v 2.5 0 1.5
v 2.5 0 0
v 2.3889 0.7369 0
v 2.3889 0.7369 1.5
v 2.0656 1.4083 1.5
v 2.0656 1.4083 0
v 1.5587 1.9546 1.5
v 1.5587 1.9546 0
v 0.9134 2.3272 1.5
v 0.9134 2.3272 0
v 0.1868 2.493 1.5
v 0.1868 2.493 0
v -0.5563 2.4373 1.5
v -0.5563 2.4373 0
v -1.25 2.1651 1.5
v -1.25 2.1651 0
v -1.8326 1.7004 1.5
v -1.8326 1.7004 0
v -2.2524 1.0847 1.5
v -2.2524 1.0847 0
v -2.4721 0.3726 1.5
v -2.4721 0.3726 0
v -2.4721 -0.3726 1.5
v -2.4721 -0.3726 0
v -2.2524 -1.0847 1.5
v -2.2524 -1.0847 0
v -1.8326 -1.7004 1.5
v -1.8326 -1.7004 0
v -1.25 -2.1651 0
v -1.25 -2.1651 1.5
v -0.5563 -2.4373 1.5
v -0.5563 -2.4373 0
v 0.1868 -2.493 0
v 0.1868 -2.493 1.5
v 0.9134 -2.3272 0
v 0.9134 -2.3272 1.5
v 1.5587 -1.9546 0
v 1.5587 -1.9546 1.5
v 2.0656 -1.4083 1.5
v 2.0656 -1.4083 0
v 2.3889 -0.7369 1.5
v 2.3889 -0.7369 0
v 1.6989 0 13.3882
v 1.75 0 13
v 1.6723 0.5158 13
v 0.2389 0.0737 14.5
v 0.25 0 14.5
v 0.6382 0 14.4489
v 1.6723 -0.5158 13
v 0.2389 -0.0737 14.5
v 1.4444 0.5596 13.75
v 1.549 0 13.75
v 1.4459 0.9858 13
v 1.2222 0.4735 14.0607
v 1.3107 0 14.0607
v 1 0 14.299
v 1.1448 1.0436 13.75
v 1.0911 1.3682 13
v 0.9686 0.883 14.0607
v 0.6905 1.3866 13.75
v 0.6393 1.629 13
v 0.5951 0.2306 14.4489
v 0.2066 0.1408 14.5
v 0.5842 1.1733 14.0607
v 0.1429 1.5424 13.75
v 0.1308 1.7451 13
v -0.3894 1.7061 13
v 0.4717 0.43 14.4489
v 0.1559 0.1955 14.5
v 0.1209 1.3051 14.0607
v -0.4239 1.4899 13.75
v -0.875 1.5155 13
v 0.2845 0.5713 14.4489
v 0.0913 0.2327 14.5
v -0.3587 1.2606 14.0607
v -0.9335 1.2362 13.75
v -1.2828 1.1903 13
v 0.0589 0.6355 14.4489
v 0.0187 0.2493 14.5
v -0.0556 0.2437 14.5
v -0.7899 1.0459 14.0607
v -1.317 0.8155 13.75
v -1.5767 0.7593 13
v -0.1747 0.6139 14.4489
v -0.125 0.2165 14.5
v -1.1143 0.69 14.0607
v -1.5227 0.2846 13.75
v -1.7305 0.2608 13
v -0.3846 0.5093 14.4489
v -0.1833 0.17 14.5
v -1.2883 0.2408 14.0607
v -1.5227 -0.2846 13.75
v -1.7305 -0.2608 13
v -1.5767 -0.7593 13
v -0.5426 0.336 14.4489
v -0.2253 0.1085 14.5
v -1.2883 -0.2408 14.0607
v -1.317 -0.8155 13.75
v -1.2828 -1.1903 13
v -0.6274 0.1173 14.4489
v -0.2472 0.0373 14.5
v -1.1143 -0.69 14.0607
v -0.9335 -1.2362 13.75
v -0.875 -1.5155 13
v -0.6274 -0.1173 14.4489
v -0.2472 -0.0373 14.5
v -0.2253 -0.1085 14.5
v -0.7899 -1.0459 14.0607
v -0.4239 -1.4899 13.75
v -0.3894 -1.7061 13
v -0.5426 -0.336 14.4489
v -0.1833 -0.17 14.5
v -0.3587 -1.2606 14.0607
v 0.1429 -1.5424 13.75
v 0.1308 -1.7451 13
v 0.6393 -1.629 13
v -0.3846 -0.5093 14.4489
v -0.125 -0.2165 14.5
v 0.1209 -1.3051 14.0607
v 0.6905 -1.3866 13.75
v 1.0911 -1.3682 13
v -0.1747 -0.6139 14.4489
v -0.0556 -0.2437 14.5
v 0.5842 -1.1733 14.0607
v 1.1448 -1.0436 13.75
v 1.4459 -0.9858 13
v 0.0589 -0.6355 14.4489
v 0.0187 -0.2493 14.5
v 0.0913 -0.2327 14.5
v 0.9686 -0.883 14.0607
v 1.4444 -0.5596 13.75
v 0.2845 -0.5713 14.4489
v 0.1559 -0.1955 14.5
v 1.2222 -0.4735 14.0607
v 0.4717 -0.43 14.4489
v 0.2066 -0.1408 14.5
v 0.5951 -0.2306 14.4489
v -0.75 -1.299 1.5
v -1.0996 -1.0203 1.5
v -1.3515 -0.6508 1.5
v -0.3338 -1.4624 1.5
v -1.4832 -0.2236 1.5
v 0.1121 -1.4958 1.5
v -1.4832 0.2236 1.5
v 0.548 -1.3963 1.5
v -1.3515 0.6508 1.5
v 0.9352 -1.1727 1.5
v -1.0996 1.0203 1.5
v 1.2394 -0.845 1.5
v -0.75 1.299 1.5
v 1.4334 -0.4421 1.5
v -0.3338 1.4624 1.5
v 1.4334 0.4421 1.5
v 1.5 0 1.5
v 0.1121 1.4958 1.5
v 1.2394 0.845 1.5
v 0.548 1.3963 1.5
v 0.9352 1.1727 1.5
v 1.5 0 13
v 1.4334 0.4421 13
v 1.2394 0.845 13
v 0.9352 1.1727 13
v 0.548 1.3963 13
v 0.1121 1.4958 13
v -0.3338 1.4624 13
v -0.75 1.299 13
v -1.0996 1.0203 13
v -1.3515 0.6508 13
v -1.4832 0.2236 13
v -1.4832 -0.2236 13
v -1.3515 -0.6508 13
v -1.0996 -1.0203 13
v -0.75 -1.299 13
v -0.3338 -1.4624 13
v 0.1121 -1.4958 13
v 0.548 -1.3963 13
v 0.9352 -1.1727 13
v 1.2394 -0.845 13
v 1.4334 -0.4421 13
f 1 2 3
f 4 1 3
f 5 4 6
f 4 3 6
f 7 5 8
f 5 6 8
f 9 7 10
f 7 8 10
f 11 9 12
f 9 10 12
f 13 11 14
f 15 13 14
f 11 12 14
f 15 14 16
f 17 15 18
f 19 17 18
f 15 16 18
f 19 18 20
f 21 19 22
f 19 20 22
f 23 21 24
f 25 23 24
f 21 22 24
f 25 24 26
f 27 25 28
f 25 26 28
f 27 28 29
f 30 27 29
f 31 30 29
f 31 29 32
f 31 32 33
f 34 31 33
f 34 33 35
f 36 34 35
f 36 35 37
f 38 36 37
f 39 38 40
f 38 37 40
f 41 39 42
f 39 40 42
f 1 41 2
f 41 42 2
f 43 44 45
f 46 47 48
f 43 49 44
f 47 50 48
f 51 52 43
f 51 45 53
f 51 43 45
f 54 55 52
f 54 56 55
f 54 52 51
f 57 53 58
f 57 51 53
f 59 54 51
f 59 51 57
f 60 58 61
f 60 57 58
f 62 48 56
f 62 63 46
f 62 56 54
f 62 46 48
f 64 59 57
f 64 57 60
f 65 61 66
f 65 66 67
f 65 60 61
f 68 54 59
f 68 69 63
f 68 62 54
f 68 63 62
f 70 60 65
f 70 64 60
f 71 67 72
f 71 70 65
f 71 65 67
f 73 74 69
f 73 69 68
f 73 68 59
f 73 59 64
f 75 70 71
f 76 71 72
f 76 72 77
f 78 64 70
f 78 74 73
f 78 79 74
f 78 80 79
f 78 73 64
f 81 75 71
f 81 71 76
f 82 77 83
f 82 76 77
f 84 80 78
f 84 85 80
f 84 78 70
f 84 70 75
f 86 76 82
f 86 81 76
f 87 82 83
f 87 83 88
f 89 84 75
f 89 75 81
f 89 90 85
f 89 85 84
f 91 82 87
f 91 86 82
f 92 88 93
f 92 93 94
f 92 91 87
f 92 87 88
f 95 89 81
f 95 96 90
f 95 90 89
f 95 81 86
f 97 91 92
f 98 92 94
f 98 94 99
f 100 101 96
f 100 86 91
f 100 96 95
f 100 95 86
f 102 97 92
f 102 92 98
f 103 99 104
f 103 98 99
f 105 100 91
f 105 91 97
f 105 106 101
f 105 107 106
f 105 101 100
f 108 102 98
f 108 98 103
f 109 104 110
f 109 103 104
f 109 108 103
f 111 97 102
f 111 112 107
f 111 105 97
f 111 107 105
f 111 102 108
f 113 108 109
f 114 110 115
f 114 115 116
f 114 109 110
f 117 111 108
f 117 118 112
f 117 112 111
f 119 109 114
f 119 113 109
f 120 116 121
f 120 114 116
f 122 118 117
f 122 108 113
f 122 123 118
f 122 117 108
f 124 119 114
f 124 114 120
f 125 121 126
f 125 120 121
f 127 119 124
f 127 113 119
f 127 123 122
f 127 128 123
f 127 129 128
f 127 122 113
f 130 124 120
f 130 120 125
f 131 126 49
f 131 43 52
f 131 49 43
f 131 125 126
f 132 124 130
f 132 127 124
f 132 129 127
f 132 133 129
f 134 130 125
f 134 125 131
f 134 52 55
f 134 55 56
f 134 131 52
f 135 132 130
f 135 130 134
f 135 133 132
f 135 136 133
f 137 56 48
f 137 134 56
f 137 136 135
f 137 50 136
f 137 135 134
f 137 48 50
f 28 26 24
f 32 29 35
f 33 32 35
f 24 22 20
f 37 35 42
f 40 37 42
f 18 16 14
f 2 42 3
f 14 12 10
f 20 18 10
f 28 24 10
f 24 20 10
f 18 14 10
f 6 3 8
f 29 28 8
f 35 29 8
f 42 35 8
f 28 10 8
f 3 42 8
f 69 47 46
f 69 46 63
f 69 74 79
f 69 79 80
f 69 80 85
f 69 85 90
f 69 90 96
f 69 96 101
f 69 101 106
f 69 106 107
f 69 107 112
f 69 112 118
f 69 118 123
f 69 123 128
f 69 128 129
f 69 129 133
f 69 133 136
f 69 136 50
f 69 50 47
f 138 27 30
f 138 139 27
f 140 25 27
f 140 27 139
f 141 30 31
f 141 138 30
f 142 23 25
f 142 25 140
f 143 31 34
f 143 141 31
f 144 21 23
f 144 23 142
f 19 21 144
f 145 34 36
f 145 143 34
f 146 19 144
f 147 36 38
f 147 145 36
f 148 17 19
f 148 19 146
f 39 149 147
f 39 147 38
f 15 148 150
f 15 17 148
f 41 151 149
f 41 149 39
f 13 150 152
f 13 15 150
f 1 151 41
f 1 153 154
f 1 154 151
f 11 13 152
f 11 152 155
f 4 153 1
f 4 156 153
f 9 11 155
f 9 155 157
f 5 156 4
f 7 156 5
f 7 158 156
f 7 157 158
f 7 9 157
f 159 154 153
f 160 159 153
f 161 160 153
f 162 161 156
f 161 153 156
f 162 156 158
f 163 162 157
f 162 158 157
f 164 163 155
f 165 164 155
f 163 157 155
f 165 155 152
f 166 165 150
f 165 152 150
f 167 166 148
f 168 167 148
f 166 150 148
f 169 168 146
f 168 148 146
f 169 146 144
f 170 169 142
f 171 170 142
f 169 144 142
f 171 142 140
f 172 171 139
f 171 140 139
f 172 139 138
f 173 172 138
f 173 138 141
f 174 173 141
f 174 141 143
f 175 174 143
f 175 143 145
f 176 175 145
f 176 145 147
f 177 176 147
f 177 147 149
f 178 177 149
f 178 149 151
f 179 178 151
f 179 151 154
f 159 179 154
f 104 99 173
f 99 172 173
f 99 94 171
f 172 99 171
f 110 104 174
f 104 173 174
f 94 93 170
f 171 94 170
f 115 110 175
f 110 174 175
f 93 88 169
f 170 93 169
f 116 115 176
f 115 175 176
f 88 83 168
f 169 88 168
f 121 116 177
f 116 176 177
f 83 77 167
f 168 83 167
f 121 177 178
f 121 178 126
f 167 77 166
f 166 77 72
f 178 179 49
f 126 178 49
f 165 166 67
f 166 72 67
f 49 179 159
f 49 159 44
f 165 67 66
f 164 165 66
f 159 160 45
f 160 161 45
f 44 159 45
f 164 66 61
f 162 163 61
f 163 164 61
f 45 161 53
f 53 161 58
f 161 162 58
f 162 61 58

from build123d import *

# Parameters (mm, degrees)
F0_R     = 1.5
F1_DEPTH = 13
F0_R_2   = 2.5
F2_DEPTH = 1.5
F3_R     = 1.75
F4_DEPTH = 1.5
F5_R     = 1.49999


# Not quite as in the source:
# - a fillet or chamfer is up to 0.001 mm smaller than in the source, because OpenCascade refuses the exact size


with BuildPart() as f1:
    # F0 (on Top) → F1 (new body)
    with BuildSketch(Plane.XY):
        Circle(F0_R)
    extrude(amount=F1_DEPTH)

    # F0 (on Top) → F2 (join)
    with BuildSketch(Plane.XY):
        Circle(F0_R_2)
        Circle(F0_R, mode=Mode.SUBTRACT)
    extrude(amount=F2_DEPTH)

    # F3 (on face) → F4 (join)
    with BuildSketch(Plane.XY.offset(13)):
        Circle(F3_R)
    extrude(amount=F4_DEPTH)

    # F5 (radius 1.5 in the source; OpenCascade refuses exactly that, so slightly less here)
    f5_edges = [f1.edges().sort_by_distance(p)[0] for p in [
        (-1.75, 0, 14.5),
    ]]
    fillet(f5_edges, radius=F5_R)


solid = f1.part
